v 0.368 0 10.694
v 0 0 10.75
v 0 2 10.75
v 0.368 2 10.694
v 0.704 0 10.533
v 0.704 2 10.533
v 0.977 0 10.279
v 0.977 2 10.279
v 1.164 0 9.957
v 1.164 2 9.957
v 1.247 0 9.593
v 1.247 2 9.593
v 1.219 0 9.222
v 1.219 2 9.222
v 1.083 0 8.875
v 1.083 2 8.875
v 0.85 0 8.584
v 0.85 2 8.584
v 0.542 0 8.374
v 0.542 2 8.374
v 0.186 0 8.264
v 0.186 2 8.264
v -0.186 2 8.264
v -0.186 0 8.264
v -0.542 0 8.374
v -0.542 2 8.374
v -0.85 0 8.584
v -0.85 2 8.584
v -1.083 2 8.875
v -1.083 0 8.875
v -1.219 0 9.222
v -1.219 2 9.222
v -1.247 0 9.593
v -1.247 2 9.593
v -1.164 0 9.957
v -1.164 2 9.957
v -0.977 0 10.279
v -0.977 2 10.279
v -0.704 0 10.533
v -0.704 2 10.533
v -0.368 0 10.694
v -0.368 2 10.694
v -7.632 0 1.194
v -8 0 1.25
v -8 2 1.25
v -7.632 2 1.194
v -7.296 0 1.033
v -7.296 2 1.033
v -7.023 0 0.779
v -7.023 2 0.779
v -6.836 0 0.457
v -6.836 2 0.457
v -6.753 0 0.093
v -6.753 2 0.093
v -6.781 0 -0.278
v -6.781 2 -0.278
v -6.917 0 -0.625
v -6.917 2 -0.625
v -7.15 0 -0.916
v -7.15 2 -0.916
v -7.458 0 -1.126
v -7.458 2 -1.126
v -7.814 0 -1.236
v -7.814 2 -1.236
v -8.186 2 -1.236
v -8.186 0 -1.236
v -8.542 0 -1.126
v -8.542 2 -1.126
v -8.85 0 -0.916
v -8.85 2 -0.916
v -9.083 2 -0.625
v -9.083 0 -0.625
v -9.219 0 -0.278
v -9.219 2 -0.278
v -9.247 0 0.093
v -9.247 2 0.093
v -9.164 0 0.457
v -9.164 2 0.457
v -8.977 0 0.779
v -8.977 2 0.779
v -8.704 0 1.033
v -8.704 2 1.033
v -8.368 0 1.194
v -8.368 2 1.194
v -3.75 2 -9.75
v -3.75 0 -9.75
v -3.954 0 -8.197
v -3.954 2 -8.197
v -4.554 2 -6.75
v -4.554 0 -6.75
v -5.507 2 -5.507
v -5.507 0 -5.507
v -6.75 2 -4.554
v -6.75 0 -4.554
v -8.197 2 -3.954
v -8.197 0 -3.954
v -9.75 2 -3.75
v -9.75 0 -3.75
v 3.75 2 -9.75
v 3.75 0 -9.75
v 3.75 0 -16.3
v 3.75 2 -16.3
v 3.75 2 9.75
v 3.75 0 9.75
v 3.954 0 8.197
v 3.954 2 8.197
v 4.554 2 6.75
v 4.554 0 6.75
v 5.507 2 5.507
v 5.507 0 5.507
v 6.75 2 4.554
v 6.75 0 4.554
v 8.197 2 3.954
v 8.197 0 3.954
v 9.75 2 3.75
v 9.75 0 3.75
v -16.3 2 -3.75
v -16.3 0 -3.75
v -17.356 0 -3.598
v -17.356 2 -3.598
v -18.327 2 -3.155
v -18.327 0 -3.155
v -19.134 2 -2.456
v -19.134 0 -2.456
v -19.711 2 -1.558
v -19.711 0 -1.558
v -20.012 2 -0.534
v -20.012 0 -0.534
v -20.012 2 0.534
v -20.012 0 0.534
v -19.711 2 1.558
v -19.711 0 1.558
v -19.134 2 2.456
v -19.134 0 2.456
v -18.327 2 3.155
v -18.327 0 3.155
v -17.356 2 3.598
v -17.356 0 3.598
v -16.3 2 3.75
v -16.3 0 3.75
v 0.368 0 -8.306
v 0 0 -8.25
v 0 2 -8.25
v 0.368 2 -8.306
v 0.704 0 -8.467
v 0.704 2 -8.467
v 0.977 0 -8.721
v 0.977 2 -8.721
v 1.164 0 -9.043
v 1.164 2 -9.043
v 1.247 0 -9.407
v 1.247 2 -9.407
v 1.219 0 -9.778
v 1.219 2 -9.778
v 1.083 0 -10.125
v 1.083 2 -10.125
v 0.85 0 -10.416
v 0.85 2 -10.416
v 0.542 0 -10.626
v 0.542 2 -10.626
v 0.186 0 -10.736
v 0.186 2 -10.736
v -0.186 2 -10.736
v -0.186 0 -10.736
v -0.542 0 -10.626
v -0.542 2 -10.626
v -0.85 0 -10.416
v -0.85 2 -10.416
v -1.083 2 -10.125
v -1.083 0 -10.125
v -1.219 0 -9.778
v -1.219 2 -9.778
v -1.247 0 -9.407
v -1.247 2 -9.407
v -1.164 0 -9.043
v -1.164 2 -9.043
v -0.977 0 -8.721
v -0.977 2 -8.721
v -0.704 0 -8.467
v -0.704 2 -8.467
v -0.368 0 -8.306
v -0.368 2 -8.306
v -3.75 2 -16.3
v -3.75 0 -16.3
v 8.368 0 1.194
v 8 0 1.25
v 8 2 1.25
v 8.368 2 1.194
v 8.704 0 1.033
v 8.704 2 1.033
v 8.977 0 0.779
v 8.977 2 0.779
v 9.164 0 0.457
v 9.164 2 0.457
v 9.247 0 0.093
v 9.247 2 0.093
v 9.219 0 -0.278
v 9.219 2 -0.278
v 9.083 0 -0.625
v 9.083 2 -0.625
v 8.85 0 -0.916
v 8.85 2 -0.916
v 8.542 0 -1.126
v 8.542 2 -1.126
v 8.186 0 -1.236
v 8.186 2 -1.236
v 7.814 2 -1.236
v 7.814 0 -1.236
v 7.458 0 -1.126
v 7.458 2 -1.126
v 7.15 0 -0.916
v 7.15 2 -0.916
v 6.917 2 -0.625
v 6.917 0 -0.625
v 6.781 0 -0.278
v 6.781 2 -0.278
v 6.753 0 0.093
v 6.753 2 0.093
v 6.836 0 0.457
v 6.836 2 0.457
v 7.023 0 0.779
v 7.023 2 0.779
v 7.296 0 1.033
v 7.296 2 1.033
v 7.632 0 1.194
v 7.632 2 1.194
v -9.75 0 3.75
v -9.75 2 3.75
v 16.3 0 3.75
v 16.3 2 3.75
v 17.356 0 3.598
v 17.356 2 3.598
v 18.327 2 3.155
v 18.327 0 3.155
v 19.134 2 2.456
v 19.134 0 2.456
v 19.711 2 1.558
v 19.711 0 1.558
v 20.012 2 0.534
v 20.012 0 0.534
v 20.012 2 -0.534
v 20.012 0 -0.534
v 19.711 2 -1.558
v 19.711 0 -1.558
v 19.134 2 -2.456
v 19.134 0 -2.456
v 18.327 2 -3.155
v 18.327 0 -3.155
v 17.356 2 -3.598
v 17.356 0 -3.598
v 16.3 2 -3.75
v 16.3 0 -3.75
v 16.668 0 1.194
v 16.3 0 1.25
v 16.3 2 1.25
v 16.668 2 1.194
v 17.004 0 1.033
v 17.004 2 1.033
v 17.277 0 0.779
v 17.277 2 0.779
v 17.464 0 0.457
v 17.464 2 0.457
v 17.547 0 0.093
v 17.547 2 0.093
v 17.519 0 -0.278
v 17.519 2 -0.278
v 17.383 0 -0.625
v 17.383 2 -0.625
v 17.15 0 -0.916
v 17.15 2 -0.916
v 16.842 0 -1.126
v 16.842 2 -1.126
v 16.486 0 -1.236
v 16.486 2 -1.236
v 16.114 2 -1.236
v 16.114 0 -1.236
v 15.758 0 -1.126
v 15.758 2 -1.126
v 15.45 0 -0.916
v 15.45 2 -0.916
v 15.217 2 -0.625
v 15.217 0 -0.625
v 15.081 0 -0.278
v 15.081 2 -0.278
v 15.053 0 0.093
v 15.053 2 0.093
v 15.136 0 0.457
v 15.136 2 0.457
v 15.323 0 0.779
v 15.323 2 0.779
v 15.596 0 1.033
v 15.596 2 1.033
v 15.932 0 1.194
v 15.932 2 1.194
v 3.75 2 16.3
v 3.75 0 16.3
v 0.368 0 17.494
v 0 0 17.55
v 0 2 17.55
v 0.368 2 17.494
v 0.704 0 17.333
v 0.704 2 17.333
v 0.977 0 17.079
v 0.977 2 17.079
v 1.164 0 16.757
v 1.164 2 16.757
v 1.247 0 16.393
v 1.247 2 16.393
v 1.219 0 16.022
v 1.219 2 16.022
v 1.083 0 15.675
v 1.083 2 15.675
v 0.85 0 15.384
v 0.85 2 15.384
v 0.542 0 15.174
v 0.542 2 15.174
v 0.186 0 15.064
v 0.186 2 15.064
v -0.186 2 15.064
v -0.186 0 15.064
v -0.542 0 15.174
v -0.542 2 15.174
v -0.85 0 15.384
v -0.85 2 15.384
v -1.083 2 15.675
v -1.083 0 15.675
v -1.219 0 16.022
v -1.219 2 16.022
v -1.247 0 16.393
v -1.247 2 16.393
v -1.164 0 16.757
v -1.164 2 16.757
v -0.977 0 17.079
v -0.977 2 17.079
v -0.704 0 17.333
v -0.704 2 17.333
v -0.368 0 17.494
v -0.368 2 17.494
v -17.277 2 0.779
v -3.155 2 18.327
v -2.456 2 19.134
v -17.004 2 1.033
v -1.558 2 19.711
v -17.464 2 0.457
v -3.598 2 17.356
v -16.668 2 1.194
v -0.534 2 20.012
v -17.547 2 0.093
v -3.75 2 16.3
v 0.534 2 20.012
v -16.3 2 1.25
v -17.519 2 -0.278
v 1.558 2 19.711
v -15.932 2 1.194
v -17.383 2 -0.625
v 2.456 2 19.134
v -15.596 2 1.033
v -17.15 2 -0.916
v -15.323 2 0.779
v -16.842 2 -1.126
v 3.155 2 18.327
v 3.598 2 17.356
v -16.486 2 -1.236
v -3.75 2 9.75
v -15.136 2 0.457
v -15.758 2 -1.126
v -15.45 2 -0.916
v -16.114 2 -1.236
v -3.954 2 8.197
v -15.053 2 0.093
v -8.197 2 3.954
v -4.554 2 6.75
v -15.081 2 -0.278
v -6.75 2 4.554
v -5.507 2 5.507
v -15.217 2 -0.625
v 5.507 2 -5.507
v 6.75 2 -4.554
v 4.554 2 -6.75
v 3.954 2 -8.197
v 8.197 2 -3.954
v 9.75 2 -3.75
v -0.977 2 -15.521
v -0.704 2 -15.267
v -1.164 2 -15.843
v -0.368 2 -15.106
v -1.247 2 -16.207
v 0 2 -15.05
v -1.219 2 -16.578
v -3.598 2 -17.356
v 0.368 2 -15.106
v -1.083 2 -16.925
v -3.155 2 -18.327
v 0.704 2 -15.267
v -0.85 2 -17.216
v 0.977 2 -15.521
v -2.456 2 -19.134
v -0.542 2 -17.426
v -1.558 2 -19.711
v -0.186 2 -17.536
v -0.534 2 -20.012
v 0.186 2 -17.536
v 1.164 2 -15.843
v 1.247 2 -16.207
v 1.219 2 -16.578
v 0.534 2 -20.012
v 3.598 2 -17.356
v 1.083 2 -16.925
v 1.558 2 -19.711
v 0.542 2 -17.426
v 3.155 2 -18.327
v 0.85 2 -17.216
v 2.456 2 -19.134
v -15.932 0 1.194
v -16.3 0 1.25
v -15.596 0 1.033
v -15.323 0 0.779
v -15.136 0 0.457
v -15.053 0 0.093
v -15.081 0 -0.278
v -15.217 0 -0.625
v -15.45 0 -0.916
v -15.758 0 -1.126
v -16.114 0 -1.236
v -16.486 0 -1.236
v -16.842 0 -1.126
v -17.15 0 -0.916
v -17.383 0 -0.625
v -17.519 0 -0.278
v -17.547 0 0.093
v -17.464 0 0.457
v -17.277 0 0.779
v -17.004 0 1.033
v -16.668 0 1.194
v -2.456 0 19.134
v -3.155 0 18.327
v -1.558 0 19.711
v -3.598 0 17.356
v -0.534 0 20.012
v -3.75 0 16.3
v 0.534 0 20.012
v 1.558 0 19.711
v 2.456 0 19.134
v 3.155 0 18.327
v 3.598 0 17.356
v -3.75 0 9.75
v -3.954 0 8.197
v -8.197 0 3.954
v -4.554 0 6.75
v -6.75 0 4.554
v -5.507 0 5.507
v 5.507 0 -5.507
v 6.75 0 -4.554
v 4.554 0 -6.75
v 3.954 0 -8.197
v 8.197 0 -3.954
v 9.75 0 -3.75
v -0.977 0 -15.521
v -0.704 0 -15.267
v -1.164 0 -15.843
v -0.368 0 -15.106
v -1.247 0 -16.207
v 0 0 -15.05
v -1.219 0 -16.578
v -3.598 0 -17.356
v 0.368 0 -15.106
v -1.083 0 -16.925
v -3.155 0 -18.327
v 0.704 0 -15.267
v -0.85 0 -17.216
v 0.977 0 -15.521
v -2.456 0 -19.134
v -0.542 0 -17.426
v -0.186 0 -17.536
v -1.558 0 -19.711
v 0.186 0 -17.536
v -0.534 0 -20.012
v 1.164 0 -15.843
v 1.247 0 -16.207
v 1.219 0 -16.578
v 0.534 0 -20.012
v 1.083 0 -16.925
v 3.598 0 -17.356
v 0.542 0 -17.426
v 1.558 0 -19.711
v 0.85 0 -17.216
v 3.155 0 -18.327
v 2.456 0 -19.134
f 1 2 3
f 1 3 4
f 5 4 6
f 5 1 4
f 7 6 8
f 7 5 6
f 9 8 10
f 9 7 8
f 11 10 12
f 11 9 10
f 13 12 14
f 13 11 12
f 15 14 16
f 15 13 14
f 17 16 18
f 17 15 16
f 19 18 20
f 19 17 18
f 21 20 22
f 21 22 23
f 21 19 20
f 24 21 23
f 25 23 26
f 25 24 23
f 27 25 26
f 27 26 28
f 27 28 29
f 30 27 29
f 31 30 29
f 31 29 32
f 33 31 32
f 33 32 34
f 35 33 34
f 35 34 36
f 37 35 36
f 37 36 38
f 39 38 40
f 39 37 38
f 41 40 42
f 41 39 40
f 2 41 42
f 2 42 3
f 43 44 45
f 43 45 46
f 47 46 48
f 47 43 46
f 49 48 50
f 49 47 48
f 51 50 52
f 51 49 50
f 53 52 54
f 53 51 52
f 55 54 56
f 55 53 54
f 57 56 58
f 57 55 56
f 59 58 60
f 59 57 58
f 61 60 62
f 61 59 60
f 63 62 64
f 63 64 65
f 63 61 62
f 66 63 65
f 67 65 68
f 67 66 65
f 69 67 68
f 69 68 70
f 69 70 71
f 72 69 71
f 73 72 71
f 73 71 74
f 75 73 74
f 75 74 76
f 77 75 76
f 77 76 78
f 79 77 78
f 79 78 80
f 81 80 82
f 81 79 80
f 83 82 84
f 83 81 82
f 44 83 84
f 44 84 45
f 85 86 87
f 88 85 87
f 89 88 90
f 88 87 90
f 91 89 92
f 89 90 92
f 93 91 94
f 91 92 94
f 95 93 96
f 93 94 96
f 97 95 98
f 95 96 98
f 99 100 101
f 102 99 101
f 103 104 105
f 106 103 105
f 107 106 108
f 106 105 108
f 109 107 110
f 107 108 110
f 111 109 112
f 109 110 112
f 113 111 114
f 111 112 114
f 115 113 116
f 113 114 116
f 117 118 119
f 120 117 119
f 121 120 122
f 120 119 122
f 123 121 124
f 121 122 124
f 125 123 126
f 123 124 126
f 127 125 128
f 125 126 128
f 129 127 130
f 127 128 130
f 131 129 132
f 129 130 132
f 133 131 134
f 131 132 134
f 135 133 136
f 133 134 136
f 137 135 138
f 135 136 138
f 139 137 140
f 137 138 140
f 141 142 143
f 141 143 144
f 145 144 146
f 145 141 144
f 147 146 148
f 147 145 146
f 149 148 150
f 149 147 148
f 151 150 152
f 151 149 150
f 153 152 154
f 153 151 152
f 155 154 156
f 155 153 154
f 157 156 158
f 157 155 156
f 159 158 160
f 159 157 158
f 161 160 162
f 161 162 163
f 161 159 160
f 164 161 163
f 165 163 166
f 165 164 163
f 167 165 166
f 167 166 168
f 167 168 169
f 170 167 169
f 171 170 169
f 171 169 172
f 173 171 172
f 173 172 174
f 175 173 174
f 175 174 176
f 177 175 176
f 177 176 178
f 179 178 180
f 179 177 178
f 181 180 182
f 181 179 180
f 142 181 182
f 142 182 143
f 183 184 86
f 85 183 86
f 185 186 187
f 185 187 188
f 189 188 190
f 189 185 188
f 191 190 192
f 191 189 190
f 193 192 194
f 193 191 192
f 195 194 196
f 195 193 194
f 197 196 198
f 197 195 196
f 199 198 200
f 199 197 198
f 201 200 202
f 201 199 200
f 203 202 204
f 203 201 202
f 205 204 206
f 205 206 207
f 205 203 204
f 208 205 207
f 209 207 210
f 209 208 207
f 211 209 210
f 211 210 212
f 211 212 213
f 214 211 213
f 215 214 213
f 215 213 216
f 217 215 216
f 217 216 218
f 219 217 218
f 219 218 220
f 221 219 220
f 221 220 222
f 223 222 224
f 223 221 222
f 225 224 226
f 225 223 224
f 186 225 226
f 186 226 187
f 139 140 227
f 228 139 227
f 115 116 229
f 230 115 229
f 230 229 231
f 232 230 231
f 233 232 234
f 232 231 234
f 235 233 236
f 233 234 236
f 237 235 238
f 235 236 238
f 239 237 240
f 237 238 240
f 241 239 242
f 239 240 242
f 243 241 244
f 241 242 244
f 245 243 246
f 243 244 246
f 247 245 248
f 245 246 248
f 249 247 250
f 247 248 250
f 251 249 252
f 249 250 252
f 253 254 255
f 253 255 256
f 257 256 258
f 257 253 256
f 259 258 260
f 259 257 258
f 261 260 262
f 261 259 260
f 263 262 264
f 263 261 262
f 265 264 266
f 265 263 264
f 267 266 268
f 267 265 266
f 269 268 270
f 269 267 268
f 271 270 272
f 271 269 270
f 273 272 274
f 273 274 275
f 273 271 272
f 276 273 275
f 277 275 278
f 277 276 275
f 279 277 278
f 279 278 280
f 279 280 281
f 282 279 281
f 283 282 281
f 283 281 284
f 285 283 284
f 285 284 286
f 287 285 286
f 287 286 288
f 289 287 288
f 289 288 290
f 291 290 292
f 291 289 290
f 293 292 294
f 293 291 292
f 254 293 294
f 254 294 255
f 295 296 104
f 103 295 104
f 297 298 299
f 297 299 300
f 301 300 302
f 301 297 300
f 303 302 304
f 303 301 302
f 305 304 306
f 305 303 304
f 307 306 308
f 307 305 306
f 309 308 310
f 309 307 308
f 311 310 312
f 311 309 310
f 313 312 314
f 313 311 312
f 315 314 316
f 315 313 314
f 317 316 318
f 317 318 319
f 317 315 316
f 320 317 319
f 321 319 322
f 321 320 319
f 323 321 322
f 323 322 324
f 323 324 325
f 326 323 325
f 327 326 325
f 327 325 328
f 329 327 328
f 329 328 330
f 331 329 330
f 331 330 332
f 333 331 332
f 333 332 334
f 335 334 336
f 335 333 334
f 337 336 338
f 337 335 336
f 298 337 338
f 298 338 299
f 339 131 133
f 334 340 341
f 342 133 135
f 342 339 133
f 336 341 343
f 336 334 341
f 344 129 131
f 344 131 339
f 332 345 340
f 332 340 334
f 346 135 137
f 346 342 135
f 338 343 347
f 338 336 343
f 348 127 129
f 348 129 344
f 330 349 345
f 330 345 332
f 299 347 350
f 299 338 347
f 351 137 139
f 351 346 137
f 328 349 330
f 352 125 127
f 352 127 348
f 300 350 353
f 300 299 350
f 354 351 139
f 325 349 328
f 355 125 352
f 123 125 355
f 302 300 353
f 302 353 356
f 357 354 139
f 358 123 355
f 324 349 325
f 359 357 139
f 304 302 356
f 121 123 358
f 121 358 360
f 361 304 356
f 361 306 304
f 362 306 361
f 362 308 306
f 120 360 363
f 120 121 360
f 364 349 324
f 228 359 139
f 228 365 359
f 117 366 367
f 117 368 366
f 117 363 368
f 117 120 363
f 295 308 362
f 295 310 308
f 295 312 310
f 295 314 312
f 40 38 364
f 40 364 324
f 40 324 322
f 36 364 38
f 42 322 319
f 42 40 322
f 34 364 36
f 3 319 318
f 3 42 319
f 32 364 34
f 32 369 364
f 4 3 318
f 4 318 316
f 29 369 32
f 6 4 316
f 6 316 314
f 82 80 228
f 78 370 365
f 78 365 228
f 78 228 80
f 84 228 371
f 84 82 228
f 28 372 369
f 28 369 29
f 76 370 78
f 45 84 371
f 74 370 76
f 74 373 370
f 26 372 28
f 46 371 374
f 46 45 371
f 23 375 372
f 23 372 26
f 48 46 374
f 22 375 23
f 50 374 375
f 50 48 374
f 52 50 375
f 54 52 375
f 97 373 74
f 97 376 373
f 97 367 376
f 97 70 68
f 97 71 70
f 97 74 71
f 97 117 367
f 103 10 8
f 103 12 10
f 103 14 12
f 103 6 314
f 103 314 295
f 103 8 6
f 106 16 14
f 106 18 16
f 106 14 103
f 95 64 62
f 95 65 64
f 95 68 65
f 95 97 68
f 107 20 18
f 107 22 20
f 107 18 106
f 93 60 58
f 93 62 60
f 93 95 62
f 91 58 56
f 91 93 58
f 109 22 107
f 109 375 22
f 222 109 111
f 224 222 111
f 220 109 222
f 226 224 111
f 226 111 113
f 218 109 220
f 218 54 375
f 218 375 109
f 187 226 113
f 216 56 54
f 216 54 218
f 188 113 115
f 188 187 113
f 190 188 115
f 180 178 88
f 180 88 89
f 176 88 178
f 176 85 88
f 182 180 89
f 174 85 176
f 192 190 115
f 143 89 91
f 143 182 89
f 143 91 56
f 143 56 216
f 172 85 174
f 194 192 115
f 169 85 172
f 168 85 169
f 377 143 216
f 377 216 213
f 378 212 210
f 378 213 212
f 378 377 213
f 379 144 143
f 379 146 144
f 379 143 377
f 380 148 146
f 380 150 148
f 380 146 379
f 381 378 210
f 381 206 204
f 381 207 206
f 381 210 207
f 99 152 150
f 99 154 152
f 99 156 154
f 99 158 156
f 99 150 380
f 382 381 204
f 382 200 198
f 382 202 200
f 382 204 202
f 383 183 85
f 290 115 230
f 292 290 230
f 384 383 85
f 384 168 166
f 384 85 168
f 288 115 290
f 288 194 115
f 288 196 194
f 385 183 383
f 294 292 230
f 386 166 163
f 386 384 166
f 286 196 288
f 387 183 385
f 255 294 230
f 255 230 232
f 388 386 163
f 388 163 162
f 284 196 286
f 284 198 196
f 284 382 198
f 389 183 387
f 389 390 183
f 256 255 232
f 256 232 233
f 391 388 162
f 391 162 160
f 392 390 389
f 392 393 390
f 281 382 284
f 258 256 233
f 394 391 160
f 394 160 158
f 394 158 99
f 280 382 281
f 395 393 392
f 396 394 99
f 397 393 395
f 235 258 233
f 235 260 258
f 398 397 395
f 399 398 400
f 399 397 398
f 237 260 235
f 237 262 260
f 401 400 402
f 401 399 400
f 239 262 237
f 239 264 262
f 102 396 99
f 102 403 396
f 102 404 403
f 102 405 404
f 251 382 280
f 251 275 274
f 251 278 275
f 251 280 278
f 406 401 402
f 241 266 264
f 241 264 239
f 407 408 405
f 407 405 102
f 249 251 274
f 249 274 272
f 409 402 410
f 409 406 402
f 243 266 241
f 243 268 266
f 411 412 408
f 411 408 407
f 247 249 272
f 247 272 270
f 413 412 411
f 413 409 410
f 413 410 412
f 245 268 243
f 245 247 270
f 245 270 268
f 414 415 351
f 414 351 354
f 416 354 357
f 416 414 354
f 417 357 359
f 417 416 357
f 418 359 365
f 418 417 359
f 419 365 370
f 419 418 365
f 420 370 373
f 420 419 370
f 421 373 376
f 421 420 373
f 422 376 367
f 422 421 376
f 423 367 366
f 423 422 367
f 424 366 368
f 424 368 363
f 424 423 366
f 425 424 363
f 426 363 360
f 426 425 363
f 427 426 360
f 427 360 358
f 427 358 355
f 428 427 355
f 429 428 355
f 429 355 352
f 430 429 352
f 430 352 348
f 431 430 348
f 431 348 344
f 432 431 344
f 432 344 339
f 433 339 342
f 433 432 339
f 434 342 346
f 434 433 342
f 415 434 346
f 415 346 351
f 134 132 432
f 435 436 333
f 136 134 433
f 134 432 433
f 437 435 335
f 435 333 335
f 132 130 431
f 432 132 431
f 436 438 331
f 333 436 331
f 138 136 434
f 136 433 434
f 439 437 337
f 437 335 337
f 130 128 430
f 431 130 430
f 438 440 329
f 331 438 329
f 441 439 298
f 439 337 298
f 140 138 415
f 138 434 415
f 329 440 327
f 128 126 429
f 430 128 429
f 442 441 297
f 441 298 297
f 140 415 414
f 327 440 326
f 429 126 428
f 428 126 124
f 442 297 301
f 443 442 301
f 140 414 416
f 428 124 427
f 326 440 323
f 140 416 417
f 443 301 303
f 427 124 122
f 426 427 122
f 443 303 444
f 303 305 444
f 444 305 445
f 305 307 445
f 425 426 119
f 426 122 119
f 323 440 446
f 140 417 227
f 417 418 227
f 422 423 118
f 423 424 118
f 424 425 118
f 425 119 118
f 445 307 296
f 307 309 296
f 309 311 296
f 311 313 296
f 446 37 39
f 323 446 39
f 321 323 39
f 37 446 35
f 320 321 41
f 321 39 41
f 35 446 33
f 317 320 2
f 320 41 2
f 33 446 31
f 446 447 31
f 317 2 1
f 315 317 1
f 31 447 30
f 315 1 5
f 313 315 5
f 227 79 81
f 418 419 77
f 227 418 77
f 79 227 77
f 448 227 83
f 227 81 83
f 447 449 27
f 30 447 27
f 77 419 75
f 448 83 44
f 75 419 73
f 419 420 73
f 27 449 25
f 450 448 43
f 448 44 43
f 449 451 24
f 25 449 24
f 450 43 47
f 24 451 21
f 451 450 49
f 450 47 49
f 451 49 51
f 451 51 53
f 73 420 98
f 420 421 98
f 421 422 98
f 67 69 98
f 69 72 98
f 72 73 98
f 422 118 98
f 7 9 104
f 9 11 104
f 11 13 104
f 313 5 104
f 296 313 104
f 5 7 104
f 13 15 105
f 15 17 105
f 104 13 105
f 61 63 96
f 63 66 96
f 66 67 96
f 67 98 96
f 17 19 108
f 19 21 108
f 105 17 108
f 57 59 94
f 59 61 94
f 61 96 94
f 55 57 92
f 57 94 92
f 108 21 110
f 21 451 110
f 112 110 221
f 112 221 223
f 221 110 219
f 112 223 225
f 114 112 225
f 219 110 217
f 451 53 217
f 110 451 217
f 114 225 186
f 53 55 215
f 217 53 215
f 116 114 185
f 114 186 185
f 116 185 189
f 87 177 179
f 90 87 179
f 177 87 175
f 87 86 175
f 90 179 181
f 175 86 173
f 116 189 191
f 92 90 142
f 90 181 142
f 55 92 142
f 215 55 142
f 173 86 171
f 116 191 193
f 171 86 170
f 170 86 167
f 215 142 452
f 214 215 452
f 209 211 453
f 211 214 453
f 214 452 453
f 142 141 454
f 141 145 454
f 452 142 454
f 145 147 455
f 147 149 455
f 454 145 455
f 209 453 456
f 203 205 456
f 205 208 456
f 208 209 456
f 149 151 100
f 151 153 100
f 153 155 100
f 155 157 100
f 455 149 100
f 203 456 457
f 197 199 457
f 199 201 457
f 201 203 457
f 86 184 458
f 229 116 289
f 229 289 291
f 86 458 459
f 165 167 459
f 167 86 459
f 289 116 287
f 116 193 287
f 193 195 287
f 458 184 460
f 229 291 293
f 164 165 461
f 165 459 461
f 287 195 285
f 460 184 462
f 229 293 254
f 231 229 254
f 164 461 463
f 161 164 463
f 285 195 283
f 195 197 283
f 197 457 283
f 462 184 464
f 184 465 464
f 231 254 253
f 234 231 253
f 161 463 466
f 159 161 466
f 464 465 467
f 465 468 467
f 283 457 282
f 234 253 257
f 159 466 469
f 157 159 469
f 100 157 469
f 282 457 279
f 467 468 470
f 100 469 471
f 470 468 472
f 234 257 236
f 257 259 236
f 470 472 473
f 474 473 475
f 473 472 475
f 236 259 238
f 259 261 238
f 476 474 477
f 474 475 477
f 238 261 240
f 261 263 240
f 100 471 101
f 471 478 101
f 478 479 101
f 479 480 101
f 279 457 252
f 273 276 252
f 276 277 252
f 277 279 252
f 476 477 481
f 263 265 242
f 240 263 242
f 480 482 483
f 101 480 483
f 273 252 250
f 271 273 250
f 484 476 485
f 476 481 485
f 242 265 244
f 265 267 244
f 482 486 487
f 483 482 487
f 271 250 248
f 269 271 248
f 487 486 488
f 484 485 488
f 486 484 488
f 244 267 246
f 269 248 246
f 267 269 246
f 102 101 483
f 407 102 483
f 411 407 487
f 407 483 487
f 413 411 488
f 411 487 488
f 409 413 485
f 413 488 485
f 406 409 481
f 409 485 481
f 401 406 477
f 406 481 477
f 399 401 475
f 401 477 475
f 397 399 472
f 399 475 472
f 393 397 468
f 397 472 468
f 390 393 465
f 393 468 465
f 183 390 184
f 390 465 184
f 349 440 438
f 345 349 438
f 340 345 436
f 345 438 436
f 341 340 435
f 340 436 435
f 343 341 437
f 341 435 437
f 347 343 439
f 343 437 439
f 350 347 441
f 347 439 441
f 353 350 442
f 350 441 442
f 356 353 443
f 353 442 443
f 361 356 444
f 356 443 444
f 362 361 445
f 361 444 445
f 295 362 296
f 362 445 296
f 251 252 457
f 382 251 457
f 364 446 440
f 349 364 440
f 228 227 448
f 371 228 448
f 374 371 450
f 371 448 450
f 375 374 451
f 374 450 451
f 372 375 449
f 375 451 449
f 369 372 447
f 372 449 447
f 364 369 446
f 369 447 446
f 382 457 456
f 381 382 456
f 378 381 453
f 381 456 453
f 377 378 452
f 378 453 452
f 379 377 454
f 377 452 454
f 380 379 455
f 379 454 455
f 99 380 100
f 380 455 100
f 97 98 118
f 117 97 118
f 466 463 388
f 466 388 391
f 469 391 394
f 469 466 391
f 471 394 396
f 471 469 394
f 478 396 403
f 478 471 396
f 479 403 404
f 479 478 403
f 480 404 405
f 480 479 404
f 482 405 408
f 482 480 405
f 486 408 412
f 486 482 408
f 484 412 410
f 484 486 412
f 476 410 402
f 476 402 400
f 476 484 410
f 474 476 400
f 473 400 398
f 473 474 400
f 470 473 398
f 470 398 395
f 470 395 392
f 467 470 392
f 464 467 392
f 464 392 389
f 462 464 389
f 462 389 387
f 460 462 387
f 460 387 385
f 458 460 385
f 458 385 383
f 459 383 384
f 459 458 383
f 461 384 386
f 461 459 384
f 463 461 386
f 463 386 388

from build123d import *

# Parameters (mm, degrees)
SKETCH_1_R      = 1.25
EXTRUDE_1_DEPTH = 2


with BuildPart() as part:
    # 草圖1 → 填料-伸長1 (new body)
    with BuildSketch(Plane(origin=(0, 0, 0), x_dir=(1, 0, 0), z_dir=(0, 1, 0))):
        with BuildLine():
            Line((-3.75, 16.3), (-3.75, 9.75))
            ThreePointArc((-3.75, 9.75), (-5.507359313, 5.507359313), (-9.75, 3.75))
            Line((-9.75, 3.75), (-16.3, 3.75))
            ThreePointArc((-16.3, 3.75), (-20.05, 0), (-16.3, -3.75))
            Line((-16.3, -3.75), (-9.75, -3.75))
            ThreePointArc((-9.75, -3.75), (-5.507359313, -5.507359313), (-3.75, -9.75))
            Line((-3.75, -9.75), (-3.75, -16.3))
            ThreePointArc((-3.75, -16.3), (0, -20.05), (3.75, -16.3))
            Line((3.75, -16.3), (3.75, -9.75))
            ThreePointArc((3.75, -9.75), (5.507359313, -5.507359313), (9.75, -3.75))
            Line((9.75, -3.75), (16.3, -3.75))
            ThreePointArc((16.3, -3.75), (20.05, 0), (16.3, 3.75))
            Line((16.3, 3.75), (9.75, 3.75))
            ThreePointArc((9.75, 3.75), (5.507359313, 5.507359313), (3.75, 9.75))
            Line((3.75, 9.75), (3.75, 16.3))
            ThreePointArc((3.75, 16.3), (0, 20.05), (-3.75, 16.3))
        make_face()
        with Locations(Location((0, 16.3, 0), (0, 0, 270))):
            Circle(SKETCH_1_R, mode=Mode.SUBTRACT)
        with Locations(Location((-16.3, 0, 0), (0, 0, 270))):
            Circle(SKETCH_1_R, mode=Mode.SUBTRACT)
        with Locations(Location((0, -16.3, 0), (0, 0, 270))):
            Circle(SKETCH_1_R, mode=Mode.SUBTRACT)
        with Locations(Location((16.3, 0, 0), (0, 0, 270))):
            Circle(SKETCH_1_R, mode=Mode.SUBTRACT)
        with Locations(Location((0, 9.5, 0), (0, 0, 270))):
            Circle(SKETCH_1_R, mode=Mode.SUBTRACT)
        with Locations(Location((-8, 0, 0), (0, 0, 270))):
            Circle(SKETCH_1_R, mode=Mode.SUBTRACT)
        with Locations(Location((0, -9.5, 0), (0, 0, 270))):
            Circle(SKETCH_1_R, mode=Mode.SUBTRACT)
        with Locations(Location((8, 0, 0), (0, 0, 270))):
            Circle(SKETCH_1_R, mode=Mode.SUBTRACT)
    extrude(amount=EXTRUDE_1_DEPTH)


solid = part.part
